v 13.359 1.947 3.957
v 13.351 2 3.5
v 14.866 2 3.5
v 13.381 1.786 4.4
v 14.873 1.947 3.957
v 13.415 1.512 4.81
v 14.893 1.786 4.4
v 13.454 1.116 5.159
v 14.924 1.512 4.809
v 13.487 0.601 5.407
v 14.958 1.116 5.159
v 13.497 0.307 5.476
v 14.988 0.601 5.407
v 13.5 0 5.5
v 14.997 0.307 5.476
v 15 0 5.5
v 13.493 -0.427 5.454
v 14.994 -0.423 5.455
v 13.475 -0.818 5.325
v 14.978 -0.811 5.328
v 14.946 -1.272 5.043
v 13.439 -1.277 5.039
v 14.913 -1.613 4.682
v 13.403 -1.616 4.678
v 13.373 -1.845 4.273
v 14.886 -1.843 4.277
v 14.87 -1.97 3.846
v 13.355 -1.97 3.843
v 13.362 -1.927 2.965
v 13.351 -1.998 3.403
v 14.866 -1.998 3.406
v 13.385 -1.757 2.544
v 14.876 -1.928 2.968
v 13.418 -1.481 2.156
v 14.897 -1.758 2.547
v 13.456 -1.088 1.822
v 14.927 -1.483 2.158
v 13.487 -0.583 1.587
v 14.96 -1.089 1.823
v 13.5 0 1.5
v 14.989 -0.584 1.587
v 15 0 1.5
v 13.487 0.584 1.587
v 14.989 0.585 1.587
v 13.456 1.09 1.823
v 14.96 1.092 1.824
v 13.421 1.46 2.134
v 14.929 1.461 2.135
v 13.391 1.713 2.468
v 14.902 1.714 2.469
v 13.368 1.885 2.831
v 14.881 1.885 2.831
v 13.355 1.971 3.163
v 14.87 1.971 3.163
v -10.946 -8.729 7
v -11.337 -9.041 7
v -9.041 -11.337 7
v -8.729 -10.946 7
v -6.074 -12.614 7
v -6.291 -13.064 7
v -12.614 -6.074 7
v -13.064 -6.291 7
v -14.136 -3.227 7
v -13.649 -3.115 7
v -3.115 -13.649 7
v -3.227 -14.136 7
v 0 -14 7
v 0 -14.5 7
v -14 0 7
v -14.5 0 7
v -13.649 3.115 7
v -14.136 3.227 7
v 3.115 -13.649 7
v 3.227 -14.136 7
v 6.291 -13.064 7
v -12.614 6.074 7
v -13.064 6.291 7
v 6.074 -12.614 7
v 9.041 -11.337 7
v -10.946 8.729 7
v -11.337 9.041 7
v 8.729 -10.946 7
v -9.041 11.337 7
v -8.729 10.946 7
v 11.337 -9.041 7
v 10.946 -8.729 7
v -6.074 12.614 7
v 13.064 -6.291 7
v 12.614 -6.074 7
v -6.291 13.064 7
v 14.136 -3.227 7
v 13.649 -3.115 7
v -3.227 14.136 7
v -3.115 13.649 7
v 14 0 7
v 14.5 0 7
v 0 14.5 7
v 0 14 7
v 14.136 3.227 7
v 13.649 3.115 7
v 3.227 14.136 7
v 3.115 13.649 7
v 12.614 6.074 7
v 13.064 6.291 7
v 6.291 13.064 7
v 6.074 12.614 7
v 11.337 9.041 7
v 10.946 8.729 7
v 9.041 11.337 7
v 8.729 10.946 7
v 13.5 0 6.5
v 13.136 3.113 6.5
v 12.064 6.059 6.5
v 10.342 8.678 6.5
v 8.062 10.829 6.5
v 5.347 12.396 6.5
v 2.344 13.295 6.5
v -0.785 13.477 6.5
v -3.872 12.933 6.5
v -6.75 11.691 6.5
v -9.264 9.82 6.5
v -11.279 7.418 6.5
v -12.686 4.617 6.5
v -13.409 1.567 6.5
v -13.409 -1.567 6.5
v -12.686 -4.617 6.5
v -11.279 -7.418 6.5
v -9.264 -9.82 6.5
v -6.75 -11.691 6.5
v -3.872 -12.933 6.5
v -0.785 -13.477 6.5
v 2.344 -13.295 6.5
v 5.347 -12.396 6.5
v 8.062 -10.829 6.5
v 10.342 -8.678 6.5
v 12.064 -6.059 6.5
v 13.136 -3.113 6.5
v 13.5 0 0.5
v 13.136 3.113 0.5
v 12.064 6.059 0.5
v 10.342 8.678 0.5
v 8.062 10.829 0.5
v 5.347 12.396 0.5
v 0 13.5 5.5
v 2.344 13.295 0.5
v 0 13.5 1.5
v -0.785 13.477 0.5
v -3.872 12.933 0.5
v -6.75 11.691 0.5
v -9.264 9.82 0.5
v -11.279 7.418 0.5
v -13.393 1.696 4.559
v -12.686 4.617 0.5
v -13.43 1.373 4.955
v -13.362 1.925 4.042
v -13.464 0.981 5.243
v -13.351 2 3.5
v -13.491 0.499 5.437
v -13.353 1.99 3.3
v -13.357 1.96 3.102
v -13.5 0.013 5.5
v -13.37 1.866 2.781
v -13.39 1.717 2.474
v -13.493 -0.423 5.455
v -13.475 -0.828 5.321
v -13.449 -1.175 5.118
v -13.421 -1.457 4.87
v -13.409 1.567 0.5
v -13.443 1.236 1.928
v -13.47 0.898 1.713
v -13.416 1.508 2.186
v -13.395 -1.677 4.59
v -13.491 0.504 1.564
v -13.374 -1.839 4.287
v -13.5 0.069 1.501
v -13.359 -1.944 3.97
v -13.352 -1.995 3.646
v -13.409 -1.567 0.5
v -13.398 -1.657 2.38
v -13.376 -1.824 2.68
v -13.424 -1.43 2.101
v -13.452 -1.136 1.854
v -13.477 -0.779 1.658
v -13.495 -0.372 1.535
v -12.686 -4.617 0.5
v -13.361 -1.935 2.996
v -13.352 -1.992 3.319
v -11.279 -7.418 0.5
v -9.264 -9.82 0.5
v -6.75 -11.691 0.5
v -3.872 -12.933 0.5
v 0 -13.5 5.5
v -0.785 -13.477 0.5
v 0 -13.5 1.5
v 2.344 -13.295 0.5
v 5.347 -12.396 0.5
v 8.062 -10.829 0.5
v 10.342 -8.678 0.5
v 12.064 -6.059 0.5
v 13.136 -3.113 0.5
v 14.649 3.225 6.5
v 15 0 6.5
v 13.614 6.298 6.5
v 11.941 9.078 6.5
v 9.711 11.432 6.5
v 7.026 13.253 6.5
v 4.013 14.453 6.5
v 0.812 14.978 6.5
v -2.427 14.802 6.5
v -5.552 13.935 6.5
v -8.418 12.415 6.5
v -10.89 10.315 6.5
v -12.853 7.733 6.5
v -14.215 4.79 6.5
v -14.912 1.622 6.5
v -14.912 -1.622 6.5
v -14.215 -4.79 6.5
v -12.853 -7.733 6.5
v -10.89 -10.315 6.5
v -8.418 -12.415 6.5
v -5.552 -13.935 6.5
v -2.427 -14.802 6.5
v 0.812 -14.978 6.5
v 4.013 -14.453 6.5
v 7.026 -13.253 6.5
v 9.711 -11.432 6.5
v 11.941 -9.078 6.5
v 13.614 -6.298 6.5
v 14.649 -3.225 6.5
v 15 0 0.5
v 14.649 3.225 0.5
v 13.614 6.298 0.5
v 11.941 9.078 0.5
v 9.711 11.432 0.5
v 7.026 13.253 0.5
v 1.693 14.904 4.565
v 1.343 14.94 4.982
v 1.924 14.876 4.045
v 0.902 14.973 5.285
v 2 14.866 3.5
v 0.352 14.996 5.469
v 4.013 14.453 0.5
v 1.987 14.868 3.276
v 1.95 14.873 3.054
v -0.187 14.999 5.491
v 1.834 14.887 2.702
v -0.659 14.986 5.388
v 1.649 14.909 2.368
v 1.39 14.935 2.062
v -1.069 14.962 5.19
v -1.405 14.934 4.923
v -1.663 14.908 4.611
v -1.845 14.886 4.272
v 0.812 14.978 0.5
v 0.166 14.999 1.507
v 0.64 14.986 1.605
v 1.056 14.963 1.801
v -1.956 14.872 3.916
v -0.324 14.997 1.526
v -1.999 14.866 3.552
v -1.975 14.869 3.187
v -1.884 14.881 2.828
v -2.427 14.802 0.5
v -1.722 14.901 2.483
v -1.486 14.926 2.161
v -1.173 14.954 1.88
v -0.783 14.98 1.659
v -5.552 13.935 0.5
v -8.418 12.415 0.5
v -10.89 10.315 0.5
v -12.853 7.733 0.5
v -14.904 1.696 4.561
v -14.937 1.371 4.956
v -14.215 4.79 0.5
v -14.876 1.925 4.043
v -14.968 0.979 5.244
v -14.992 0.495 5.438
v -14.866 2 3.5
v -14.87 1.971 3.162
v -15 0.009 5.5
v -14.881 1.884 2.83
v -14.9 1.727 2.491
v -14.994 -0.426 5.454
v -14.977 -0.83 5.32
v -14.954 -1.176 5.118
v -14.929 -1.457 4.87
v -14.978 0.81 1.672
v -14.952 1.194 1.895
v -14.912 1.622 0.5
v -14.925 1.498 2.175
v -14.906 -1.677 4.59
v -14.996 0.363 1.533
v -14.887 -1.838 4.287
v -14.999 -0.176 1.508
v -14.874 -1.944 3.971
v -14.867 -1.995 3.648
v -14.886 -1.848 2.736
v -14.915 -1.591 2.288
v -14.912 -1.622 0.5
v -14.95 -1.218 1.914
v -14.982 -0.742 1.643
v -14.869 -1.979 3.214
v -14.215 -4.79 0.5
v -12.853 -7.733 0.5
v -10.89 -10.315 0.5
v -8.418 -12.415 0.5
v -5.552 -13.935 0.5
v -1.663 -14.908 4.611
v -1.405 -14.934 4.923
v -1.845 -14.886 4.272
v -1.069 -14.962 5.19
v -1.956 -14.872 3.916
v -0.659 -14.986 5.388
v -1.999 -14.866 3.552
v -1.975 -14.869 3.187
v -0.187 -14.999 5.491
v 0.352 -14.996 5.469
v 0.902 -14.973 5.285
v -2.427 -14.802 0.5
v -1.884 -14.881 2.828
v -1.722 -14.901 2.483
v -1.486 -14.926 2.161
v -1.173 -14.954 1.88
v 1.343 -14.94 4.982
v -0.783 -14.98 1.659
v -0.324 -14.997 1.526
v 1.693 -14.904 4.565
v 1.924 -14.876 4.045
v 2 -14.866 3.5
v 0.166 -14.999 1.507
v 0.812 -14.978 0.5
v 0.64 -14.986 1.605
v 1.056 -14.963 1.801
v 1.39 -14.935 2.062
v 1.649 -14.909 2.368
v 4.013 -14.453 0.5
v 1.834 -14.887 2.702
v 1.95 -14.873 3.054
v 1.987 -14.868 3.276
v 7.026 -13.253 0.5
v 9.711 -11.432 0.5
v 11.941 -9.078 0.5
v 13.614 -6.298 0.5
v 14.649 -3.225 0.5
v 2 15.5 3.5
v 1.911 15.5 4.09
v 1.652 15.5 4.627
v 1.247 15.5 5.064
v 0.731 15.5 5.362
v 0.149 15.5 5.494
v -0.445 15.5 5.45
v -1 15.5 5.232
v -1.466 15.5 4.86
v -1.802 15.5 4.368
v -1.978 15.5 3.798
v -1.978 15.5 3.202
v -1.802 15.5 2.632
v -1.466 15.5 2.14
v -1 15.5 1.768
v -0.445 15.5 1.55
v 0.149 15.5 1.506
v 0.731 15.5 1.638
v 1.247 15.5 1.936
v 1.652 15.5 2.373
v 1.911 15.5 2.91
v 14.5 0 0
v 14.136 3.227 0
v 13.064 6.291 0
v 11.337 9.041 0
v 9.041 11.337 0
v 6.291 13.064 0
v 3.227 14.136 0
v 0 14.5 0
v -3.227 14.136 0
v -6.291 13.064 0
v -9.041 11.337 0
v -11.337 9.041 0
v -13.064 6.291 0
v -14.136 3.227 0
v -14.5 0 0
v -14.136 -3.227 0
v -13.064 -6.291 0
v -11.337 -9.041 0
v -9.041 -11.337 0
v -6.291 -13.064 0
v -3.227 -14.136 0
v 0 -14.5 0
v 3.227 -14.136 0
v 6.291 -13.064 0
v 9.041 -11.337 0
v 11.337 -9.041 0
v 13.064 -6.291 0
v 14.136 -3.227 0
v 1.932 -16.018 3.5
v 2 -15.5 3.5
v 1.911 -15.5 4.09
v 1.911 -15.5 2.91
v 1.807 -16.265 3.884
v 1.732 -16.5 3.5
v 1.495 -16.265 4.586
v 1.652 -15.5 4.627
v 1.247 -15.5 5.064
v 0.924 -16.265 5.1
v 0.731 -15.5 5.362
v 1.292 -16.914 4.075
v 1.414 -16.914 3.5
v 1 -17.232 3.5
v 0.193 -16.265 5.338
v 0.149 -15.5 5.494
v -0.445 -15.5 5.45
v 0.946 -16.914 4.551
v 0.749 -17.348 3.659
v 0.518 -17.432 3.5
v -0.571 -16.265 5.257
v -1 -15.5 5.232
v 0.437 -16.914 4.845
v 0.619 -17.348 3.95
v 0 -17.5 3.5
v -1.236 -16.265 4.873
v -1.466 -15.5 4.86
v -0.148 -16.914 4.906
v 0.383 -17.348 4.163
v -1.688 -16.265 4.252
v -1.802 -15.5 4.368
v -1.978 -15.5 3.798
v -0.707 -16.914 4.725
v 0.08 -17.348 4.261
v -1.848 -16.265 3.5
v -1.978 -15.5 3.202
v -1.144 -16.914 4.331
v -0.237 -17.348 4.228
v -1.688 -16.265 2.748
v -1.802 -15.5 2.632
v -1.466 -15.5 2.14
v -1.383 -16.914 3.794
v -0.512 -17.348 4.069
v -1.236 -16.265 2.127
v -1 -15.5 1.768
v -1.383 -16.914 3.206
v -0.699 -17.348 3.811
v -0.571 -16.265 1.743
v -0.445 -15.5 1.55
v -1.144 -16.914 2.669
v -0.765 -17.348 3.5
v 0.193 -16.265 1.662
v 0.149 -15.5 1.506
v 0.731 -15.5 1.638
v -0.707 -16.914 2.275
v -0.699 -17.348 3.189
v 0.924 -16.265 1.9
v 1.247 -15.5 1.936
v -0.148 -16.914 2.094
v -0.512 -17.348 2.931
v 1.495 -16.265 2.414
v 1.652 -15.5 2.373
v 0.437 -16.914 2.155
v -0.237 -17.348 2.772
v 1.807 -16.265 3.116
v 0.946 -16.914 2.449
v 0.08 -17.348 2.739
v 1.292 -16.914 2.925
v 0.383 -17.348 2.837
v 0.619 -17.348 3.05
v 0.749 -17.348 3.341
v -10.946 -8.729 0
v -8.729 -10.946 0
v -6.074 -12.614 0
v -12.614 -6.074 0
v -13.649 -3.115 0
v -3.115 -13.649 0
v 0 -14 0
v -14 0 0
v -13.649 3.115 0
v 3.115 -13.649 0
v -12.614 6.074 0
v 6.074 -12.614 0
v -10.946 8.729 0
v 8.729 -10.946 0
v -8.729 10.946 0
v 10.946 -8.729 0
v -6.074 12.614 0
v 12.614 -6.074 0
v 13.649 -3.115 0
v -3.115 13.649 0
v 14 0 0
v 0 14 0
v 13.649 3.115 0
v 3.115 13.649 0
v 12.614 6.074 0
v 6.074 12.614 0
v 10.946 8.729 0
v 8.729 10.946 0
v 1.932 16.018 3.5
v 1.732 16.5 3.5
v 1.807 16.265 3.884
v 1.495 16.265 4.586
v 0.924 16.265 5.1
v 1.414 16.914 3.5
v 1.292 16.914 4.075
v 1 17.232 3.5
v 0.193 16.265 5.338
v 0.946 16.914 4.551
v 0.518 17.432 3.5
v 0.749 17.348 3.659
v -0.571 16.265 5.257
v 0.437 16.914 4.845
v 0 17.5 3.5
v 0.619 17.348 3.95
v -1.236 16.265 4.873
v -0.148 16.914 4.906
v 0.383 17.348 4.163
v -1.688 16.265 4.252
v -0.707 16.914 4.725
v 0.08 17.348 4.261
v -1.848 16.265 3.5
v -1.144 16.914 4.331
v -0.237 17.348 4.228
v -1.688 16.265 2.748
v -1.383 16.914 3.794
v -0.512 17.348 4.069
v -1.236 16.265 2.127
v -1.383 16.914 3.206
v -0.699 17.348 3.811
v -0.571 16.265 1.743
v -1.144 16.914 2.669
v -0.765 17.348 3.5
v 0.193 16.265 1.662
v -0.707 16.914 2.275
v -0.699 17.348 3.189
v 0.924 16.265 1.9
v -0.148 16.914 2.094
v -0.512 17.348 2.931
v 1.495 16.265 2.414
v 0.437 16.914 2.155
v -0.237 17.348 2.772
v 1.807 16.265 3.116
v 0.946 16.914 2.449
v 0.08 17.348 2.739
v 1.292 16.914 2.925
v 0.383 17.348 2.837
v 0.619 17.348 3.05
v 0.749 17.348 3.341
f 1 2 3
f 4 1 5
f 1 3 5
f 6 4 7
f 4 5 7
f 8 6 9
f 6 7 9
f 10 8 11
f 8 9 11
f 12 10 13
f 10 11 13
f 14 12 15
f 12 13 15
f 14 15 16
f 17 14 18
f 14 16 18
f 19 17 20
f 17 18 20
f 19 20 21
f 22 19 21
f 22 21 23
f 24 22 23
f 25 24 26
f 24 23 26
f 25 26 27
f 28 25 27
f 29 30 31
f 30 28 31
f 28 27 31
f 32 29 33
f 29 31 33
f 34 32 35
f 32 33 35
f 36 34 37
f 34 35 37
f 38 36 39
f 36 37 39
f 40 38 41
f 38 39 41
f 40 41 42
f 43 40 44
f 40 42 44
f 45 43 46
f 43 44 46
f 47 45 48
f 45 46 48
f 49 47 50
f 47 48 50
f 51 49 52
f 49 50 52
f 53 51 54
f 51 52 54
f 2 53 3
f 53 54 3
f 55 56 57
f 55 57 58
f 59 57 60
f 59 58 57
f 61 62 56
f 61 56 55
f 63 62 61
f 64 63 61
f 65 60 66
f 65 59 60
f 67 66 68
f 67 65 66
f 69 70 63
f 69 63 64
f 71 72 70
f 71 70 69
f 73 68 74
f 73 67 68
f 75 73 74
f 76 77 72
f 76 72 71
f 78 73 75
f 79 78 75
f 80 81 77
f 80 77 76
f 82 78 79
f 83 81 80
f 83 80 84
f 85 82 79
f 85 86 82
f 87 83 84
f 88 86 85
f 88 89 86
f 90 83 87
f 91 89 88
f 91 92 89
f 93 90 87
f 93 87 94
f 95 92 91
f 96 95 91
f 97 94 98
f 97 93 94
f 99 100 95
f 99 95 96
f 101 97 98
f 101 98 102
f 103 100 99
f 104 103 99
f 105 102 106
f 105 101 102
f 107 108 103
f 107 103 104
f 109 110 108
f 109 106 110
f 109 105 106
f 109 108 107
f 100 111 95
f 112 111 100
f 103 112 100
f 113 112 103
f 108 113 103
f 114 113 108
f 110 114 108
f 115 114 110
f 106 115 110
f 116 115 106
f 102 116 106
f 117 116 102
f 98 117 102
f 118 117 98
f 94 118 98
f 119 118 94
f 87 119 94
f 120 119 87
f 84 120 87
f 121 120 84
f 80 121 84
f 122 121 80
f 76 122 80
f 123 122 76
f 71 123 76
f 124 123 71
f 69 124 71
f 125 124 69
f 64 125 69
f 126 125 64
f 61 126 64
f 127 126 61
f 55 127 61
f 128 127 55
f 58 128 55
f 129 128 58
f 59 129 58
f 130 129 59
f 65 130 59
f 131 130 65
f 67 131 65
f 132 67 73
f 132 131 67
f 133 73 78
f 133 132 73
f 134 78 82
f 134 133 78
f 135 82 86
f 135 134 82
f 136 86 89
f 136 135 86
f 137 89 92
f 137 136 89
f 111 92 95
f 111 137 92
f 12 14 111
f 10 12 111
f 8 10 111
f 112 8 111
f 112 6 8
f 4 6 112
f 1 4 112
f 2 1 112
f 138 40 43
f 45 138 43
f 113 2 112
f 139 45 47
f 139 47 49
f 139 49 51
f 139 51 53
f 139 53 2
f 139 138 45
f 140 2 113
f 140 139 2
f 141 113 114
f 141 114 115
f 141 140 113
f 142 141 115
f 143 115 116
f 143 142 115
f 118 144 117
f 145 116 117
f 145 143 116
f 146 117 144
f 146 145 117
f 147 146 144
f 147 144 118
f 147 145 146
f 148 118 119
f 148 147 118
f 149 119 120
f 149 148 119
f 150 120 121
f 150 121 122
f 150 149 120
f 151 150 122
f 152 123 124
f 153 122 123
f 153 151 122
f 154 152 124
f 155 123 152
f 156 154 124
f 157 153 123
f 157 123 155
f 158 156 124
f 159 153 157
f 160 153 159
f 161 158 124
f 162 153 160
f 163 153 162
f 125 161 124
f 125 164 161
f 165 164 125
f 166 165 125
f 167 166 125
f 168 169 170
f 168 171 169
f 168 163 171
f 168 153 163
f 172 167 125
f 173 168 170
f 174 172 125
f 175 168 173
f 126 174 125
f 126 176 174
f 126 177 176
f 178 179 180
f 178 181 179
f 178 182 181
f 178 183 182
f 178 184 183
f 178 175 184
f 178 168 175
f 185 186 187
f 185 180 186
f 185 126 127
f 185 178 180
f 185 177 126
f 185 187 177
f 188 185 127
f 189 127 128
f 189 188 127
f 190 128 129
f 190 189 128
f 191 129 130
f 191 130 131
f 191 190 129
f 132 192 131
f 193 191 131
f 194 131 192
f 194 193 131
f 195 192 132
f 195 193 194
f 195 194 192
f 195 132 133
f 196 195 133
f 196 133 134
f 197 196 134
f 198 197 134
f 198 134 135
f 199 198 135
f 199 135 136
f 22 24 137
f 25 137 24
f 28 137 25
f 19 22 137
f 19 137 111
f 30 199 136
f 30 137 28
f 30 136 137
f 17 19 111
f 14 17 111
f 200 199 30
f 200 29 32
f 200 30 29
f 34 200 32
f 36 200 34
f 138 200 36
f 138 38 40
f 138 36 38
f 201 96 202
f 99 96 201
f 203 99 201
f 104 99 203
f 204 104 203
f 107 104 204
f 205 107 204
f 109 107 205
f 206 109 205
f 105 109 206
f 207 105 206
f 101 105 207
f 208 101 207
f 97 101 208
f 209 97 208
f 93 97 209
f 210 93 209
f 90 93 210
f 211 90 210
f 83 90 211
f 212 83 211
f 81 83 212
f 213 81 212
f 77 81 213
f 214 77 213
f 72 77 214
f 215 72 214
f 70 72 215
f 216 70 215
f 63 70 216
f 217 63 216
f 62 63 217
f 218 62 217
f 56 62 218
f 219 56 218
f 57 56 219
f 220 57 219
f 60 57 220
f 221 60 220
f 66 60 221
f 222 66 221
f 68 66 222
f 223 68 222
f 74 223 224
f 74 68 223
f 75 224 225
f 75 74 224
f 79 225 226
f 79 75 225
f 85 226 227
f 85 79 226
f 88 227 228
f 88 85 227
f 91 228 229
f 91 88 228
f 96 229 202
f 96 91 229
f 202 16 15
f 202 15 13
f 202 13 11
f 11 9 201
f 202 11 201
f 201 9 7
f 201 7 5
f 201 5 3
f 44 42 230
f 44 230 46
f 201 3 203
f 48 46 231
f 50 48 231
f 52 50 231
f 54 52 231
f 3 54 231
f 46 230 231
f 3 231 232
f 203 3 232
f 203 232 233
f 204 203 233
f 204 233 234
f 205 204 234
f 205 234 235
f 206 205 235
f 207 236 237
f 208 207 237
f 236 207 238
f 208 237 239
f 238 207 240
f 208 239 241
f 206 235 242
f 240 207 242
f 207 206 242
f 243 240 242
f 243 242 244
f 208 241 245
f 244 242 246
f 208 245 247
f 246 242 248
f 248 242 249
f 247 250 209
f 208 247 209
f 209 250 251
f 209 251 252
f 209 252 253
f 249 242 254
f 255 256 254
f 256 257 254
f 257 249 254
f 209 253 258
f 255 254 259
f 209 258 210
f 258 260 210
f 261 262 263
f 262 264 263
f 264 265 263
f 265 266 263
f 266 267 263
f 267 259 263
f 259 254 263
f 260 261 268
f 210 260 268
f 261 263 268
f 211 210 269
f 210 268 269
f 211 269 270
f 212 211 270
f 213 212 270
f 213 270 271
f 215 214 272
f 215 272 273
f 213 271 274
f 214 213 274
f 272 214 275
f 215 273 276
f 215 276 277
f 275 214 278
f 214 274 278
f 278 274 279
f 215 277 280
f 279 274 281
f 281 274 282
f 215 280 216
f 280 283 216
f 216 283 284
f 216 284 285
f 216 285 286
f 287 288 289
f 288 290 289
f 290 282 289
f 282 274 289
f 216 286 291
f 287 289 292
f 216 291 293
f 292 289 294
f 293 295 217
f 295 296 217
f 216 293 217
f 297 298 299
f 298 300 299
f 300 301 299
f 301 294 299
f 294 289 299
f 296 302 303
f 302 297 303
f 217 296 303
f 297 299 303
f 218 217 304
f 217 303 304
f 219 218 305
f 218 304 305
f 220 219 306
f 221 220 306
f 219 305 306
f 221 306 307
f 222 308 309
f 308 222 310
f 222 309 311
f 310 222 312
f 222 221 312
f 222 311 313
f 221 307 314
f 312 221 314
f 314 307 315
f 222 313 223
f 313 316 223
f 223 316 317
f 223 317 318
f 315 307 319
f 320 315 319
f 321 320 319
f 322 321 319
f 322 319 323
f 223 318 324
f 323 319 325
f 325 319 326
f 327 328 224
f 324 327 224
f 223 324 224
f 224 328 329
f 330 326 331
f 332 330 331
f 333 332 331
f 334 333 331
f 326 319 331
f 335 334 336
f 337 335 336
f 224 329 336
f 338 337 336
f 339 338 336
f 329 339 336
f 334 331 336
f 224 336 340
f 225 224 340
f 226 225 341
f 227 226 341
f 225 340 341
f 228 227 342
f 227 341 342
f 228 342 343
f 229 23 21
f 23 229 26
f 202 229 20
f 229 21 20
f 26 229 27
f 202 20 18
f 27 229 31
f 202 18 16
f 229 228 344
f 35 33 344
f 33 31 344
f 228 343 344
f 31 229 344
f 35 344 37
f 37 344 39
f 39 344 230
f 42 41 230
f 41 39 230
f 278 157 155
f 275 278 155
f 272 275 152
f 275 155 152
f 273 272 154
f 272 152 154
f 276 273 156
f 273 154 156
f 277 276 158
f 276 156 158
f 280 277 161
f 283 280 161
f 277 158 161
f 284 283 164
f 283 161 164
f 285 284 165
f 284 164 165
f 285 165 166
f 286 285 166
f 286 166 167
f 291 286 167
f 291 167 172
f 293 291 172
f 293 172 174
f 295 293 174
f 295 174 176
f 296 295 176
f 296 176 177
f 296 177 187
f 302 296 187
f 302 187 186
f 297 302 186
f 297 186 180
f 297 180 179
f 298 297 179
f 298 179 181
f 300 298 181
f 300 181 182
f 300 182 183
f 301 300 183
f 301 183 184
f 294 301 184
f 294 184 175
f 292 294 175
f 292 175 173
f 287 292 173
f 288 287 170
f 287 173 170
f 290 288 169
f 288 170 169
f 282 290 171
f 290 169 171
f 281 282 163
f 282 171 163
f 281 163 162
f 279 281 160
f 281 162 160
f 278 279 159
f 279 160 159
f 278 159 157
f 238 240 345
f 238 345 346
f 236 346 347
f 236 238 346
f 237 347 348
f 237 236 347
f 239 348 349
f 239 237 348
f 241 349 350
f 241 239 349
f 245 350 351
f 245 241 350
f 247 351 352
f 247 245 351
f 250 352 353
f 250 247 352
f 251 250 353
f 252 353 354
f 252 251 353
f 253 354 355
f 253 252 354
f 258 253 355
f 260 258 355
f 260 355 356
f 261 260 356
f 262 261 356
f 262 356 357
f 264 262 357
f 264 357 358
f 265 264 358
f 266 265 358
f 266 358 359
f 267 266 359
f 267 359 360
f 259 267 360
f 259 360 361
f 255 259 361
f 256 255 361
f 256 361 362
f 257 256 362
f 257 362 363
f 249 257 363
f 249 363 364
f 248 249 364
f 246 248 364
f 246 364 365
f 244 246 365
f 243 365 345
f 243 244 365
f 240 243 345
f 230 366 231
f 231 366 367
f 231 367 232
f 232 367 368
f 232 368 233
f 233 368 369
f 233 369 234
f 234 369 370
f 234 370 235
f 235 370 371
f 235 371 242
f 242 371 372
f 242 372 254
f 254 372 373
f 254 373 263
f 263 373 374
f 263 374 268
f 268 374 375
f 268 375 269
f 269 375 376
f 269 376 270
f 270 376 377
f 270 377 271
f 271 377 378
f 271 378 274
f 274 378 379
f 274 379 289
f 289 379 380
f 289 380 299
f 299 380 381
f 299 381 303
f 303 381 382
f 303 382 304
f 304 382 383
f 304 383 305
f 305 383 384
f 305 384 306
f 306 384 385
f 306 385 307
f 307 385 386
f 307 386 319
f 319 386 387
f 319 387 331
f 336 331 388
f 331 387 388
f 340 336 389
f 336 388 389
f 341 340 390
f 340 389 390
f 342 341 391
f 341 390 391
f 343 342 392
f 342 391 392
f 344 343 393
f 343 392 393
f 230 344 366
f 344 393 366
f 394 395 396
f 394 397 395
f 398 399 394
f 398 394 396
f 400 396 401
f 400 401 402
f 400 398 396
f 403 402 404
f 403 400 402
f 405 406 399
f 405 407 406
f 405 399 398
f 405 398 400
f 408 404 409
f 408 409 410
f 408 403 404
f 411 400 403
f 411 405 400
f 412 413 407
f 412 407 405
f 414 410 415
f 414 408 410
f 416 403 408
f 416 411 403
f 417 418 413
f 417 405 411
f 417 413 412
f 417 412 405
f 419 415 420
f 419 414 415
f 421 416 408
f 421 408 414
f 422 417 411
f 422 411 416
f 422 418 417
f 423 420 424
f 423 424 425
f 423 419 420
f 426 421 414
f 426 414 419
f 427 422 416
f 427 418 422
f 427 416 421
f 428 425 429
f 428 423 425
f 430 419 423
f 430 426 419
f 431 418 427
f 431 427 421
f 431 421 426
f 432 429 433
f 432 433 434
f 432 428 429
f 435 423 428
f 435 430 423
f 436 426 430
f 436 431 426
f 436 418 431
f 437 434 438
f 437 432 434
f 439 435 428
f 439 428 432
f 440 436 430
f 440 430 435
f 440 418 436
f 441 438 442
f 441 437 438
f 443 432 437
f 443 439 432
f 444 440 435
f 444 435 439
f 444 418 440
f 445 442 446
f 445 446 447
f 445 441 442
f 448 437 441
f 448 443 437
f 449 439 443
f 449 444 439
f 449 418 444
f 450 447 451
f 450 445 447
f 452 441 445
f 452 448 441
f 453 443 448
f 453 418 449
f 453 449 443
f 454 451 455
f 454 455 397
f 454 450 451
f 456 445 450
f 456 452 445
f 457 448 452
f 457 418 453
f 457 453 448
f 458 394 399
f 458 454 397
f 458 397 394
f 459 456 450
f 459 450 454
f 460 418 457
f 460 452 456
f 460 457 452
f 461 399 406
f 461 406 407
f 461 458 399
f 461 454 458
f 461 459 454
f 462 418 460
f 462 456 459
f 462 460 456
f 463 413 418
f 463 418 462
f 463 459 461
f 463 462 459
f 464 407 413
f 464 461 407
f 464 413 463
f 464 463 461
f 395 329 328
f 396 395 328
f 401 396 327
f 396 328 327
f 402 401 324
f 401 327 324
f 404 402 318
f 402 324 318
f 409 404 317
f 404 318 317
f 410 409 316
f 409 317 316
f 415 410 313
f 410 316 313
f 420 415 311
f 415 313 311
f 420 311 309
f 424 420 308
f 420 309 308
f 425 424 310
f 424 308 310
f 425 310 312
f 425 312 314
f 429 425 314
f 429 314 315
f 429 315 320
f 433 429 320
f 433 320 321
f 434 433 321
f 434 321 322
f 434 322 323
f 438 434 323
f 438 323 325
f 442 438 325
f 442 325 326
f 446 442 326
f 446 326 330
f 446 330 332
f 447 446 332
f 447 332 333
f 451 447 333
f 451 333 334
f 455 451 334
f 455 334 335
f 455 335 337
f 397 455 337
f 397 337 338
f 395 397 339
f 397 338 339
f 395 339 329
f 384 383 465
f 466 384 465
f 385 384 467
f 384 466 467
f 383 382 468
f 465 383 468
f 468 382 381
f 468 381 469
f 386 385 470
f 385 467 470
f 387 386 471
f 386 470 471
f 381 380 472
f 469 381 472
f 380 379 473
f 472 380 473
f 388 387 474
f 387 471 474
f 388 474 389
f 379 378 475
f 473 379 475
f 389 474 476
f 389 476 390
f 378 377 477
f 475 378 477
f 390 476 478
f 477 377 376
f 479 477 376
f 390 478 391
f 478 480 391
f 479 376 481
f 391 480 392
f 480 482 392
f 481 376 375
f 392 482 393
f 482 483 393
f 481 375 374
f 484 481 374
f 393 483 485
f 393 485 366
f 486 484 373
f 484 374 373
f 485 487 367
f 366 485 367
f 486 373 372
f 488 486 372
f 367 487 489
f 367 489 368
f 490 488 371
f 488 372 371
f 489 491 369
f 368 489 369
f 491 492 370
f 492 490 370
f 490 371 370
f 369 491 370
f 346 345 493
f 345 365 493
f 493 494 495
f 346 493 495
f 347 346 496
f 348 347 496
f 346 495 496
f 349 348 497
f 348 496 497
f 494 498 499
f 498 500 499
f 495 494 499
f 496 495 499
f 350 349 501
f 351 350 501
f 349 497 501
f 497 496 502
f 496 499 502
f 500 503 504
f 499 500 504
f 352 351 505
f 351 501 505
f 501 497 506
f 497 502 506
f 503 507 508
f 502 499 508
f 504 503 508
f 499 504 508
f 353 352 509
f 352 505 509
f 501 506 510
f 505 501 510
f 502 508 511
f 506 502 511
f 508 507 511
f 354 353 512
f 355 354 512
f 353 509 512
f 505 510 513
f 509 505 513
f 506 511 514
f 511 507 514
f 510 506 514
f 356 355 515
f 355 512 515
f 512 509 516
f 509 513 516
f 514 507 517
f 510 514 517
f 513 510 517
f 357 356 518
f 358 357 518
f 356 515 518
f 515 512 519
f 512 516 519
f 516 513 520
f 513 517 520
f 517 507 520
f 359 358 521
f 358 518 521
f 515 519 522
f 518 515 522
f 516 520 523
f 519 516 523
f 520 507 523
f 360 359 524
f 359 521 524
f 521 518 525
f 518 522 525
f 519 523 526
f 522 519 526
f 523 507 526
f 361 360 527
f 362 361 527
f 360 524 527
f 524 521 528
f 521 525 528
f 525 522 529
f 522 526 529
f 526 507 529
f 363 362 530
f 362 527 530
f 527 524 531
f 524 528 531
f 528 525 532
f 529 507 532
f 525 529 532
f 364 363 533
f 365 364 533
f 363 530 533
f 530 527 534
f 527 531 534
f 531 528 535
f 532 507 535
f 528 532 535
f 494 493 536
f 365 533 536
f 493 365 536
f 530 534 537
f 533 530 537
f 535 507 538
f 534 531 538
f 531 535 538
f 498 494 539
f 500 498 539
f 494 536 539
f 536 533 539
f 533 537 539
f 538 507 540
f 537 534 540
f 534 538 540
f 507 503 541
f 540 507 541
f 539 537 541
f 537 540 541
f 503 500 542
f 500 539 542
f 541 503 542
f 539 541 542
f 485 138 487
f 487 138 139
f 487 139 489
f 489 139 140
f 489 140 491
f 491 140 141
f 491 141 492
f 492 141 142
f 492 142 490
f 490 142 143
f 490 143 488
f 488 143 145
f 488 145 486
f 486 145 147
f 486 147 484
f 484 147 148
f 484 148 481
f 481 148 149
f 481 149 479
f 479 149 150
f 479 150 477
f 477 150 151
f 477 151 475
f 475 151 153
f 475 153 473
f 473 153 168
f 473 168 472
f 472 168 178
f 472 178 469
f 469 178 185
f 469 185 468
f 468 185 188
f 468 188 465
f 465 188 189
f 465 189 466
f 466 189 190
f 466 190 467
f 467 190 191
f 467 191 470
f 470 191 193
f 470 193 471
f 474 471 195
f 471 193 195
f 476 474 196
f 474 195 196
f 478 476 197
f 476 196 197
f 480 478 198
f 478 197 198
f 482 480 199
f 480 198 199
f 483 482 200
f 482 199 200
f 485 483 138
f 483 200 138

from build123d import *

# Parameters (mm, degrees)
F0_R     = 15
F0_R_2   = 13.5
F1_DEPTH = 7
F2_R     = 2
F3_DEPTH = 20
F4_SIZE  = 0.5
F6_R     = 2
F7_DEPTH = 4
F9_R     = 2


with BuildPart() as f1:
    # F0 (on Top) → F1 (new body)
    with BuildSketch(Plane.XY):
        Circle(F0_R)
        Circle(F0_R_2, mode=Mode.SUBTRACT)
    extrude(amount=F1_DEPTH)

    # F2 (on Right) → F3 (cut, symmetric)
    with BuildSketch(Plane.YZ):
        with Locations((0, 3.5)):
            Circle(F2_R)
    extrude(amount=F3_DEPTH, both=True, mode=Mode.SUBTRACT)

    # F4
    f4_edges = [f1.edges().sort_by_distance(p)[0] for p in [
        (-15, 0, 7),
        (-13.5, 0, 7),
        (-15, 0, 0),
        (-13.5, 0, 0),
    ]]
    chamfer(f4_edges, length=F4_SIZE)

    # F6 (on offset) → F7 (join)
    with BuildSketch(Plane.XZ.offset(-13.5)):
        with Locations((0, 3.5)):
            Circle(F6_R)
    extrude(amount=-F7_DEPTH)

    # F8: F1 across plane


with BuildPart() as f1_1:
    add(f1.part)
    add(f1.part.mirror(Plane.XZ))

    # F9
    f9_edges = [f1_1.edges().sort_by_distance(p)[0] for p in [
        (-2, -17.5, 3.5),
        (-2, 17.5, 3.5),
    ]]
    fillet(f9_edges, radius=F9_R)


solid = f1_1.part
